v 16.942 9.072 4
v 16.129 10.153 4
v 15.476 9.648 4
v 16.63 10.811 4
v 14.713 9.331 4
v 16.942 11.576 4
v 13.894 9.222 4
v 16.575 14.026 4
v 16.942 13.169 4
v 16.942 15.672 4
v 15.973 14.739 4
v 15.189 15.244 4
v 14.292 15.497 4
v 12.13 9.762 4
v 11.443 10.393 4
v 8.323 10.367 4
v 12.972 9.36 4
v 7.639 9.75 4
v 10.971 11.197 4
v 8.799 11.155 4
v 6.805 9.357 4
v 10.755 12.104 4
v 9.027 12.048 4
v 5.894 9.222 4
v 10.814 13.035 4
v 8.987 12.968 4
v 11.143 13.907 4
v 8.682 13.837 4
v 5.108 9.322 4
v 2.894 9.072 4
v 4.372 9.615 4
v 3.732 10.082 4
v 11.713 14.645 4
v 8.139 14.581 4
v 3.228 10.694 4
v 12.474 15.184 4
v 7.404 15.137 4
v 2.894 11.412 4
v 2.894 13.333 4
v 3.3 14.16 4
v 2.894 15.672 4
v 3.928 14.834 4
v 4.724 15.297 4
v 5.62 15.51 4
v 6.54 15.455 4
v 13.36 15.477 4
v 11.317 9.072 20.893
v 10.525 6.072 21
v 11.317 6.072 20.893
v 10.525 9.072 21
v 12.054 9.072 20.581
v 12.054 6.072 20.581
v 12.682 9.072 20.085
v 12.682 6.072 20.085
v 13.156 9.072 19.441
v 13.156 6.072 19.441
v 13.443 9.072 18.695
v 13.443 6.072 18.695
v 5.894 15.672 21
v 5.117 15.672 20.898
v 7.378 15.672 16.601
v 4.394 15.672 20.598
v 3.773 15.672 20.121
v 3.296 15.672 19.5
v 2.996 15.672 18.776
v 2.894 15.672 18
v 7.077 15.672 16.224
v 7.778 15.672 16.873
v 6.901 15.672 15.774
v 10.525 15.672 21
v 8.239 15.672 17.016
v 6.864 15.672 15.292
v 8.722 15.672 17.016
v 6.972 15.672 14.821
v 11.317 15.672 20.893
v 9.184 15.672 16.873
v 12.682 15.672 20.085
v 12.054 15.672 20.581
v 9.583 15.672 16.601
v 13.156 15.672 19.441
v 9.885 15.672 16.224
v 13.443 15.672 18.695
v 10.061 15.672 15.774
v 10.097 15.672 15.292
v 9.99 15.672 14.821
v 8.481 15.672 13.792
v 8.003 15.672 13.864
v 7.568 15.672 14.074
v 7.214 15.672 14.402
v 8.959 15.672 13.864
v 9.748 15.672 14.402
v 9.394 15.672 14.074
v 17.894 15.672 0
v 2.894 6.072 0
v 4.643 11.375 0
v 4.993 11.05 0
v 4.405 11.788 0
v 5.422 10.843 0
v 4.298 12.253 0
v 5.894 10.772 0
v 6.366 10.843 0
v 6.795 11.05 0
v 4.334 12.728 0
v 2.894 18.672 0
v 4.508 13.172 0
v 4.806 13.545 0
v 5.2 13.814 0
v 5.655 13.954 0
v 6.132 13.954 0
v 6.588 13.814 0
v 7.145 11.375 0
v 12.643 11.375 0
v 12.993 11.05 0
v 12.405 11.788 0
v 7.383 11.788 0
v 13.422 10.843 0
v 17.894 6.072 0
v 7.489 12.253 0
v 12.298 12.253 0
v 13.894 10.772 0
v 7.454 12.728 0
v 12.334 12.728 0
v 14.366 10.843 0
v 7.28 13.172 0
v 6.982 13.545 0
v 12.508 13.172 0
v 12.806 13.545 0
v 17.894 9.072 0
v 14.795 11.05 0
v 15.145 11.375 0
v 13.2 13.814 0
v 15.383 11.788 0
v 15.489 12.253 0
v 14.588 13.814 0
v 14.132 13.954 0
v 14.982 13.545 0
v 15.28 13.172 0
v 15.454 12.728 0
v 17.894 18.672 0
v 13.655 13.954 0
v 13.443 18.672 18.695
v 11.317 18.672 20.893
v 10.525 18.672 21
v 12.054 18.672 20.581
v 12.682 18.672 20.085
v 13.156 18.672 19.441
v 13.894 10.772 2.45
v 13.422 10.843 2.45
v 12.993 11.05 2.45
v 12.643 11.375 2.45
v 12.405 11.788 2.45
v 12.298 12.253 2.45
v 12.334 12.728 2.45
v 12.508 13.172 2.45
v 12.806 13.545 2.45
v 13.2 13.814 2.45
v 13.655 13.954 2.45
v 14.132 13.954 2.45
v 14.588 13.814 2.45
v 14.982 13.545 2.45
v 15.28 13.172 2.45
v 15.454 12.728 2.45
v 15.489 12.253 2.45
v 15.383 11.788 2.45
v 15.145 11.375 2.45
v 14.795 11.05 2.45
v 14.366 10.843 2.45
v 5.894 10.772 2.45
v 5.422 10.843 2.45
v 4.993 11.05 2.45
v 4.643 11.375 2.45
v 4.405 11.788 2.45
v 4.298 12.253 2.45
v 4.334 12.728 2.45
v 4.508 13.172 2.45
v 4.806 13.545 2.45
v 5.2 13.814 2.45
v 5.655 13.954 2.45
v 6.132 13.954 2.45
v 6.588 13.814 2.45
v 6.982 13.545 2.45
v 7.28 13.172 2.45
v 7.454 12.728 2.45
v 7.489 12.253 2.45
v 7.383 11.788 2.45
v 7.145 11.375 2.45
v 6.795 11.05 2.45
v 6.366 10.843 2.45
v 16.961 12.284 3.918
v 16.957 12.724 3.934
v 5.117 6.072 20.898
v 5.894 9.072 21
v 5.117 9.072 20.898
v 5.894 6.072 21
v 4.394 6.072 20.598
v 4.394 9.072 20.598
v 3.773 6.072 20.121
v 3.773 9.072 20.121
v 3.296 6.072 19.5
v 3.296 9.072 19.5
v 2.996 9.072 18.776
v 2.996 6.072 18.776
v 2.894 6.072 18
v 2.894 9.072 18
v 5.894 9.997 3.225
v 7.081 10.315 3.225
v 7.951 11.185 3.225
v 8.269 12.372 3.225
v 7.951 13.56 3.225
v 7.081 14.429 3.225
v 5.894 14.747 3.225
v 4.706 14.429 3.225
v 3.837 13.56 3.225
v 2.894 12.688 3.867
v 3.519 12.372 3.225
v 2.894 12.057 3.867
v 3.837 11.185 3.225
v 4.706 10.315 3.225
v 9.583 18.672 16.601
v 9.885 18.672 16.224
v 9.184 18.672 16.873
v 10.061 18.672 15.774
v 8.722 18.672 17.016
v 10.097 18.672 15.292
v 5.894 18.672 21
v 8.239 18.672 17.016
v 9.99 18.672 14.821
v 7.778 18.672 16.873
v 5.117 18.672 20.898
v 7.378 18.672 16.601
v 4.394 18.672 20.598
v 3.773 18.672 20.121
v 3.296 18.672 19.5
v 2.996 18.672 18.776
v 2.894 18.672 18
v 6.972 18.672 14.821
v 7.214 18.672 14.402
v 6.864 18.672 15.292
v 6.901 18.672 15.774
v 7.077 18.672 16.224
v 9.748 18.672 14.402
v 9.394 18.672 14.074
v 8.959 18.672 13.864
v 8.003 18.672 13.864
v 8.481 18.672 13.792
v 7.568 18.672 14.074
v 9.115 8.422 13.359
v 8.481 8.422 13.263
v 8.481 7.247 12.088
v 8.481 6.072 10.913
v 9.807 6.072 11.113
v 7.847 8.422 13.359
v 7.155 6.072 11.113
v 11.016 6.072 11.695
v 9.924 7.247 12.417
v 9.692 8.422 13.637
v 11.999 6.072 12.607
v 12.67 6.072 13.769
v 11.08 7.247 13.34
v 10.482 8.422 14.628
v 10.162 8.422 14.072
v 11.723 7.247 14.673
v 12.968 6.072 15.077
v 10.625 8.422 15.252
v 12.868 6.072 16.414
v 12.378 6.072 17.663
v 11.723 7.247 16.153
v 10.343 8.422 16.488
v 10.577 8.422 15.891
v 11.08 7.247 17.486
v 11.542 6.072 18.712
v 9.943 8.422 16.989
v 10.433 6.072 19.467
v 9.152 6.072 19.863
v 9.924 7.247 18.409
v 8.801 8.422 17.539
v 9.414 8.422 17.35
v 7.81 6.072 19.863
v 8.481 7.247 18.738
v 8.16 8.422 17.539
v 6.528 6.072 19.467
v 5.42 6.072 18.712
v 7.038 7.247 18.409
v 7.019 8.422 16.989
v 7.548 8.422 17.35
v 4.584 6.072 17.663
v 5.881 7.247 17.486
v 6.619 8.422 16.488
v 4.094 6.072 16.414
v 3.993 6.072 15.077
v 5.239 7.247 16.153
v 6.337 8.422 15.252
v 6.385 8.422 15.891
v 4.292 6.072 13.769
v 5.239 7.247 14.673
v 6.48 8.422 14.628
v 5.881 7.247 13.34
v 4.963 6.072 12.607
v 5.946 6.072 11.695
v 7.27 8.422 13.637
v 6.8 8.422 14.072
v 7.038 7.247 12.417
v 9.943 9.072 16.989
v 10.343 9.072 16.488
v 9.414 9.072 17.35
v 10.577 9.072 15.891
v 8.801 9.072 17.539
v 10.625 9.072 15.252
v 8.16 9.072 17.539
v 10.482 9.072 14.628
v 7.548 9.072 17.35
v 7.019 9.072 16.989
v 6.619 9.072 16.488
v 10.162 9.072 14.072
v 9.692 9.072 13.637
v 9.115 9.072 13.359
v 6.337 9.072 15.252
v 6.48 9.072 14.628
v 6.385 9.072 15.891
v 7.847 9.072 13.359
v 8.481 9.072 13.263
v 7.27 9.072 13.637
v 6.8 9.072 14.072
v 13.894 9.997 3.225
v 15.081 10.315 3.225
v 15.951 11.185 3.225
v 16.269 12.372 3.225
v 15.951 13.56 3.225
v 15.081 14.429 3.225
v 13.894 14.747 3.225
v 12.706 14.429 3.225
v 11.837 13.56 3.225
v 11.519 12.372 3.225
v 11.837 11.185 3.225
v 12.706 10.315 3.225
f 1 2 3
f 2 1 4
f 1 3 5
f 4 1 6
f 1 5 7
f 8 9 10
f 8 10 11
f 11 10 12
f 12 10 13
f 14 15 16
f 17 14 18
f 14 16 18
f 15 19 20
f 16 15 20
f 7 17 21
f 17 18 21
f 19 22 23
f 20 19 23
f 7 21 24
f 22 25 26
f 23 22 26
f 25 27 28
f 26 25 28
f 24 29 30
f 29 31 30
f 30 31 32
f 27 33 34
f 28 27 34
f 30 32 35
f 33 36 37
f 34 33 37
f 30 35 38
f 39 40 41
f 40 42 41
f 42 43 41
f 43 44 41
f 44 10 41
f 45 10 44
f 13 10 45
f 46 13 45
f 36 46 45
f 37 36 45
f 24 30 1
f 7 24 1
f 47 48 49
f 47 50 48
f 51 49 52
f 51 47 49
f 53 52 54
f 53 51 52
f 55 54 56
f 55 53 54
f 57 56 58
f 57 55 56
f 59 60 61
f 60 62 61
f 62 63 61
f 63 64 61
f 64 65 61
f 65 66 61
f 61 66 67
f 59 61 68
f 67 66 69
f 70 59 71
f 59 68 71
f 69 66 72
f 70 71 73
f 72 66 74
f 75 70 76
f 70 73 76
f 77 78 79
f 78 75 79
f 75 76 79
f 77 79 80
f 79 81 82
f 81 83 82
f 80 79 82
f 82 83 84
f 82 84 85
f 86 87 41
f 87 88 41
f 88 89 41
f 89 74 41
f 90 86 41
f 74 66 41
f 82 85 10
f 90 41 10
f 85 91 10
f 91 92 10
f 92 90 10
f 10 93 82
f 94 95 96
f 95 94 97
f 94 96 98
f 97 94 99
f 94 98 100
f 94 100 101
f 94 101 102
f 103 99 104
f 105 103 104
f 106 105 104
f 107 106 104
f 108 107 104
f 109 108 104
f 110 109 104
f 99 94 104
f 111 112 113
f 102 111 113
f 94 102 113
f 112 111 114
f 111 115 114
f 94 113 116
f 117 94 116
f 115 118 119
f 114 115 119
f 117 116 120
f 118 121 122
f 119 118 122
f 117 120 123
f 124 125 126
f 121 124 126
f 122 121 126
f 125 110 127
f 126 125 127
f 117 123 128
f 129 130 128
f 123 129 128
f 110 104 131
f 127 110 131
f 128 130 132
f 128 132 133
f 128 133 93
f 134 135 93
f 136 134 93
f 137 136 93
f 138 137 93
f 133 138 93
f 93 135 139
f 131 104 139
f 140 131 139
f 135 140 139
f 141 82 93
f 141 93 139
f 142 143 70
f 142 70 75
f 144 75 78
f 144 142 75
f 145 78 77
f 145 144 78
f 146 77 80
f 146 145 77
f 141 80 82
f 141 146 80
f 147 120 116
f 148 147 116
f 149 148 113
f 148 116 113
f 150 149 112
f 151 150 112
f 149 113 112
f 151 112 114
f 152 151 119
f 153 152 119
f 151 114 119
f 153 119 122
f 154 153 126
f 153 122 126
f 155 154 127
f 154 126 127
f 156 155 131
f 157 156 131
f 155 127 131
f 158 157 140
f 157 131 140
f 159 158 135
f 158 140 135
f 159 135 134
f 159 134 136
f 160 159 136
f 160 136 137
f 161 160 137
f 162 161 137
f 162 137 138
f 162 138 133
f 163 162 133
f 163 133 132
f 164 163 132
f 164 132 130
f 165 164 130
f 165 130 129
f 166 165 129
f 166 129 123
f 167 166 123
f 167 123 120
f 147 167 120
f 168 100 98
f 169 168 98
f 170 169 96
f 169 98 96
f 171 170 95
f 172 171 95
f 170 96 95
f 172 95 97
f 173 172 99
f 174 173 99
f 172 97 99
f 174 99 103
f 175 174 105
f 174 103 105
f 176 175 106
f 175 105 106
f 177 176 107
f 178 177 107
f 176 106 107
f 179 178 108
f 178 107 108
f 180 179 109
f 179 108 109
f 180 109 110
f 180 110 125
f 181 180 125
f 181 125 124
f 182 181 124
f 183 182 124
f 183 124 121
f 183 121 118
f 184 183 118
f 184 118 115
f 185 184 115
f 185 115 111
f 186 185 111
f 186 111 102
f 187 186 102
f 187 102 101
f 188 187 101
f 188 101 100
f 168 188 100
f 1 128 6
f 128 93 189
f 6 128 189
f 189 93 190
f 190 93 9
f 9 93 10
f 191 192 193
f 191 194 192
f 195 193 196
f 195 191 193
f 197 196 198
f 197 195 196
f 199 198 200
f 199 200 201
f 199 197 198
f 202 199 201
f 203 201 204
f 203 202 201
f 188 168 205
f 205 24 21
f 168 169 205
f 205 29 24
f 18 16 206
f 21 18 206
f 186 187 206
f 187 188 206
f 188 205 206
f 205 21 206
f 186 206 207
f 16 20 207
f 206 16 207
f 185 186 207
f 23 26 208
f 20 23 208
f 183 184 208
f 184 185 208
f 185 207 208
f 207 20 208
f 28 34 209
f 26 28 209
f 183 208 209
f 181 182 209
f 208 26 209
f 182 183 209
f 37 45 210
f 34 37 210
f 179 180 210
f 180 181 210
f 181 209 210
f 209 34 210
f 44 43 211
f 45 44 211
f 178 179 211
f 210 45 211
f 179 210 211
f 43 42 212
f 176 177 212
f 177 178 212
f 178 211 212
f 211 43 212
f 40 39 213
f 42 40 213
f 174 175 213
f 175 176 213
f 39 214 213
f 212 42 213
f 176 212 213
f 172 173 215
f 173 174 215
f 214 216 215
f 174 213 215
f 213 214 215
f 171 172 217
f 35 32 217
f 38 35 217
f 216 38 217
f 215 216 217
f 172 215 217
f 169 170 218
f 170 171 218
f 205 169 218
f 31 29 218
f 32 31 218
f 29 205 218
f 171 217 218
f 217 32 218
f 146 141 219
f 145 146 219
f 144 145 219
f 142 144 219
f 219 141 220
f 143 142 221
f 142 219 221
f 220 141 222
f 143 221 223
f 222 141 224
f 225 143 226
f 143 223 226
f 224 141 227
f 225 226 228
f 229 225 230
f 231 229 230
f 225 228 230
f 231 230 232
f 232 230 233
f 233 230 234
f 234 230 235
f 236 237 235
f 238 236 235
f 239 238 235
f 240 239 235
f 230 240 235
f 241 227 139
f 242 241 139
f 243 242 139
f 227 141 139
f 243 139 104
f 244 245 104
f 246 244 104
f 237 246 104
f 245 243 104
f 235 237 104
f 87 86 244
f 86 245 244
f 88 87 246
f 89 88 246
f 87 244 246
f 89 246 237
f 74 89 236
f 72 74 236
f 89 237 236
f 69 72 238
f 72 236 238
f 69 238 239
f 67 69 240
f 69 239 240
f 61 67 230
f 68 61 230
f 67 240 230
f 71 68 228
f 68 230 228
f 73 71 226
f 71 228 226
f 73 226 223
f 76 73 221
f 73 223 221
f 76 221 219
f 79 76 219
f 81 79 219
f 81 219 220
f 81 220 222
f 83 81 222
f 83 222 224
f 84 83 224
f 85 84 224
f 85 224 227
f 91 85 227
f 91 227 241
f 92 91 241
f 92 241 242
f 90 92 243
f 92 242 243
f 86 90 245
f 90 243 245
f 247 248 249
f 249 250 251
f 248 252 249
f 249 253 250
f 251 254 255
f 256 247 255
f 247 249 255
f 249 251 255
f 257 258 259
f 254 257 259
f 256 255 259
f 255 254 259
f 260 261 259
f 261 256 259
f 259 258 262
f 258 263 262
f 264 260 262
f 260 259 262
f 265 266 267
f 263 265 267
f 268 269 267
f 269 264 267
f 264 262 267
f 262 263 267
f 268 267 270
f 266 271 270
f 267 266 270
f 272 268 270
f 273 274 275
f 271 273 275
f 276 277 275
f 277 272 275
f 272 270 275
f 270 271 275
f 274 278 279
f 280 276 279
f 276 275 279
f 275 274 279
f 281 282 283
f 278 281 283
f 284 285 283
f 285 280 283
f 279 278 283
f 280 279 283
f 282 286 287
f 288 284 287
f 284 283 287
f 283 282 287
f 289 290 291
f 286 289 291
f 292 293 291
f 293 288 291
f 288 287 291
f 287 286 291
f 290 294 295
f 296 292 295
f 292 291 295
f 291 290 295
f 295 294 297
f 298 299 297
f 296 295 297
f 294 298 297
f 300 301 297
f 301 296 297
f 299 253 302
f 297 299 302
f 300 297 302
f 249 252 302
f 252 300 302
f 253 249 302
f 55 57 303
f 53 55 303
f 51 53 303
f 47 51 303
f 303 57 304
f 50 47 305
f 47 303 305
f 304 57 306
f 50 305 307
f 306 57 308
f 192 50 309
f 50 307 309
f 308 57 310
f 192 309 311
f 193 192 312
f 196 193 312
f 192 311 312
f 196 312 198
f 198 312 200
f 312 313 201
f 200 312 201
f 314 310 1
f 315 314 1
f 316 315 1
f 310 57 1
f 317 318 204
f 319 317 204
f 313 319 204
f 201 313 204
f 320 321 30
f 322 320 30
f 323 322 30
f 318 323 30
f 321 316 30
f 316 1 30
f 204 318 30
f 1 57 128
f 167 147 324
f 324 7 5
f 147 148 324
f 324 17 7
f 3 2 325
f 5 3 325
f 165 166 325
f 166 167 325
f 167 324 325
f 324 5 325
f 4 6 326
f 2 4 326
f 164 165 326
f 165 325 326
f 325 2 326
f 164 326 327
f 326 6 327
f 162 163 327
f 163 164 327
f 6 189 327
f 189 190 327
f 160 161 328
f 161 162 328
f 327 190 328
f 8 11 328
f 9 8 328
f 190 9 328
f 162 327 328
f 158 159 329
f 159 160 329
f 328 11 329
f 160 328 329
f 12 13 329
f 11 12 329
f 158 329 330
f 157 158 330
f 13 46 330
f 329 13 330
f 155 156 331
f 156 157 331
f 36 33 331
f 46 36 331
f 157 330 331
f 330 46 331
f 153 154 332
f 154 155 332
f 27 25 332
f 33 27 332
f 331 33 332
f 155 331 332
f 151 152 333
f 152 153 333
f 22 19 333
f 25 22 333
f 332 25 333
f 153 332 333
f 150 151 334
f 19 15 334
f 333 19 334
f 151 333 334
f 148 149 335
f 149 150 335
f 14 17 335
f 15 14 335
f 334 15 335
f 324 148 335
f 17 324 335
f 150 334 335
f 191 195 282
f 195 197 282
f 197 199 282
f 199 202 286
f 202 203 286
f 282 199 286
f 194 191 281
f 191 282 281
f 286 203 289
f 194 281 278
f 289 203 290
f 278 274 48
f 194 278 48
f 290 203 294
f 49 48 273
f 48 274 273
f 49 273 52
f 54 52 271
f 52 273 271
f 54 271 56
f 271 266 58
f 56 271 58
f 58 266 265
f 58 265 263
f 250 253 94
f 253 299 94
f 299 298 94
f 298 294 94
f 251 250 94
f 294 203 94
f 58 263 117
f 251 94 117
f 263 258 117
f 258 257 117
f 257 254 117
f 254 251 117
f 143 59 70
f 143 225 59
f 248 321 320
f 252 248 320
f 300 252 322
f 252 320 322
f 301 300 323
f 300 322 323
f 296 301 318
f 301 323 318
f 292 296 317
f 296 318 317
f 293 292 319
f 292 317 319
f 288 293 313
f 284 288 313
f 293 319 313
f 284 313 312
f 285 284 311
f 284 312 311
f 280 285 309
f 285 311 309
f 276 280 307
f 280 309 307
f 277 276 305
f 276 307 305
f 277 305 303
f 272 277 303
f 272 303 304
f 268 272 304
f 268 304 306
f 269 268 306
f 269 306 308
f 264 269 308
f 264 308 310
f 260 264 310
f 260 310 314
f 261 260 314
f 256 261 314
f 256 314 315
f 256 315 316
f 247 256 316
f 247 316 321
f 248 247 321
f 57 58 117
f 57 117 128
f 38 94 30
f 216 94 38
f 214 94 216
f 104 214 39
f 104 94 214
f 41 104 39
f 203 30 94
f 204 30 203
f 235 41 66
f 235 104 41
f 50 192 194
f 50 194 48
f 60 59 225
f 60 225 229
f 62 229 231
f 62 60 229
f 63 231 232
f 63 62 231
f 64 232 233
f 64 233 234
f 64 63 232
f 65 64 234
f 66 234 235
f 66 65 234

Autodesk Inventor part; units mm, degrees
ref_plane "YZ Plane" through (0, 0, 0) normal (1, 0, 0) x (0, 1, 0)
ref_plane "XZ Plane" through (0, 0, 0) normal (0, 1, 0) x (-1, 0, 0)
ref_plane "XY Plane" through (0, 0, 0) normal (0, 0, 1) x (1, 0, 0)
sketch "Skizze1" plane through (0, 0, 0) normal (0, 0, 1) x (1, 0, 0)
  line L0 (17.8939, 18.6723) -> (2.8939, 18.6723)
  line L1 (2.8939, 18.6723) -> (2.8939, 15.6723)
  line L2 (2.8939, 15.6723) -> (17.8939, 15.6723)
  line L3 (17.8939, 15.6723) -> (17.8939, 18.6723)
  line L4 (17.8939, 9.0723) -> (2.8939, 9.0723)
  line L5 (2.8939, 9.0723) -> (2.8939, 6.0723)
  line L6 (2.8939, 6.0723) -> (17.8939, 6.0723)
  line L7 (17.8939, 6.0723) -> (17.8939, 9.0723)
  line L8 (17.8939, 15.6723) -> (17.8939, 12.3723) construction
  line L9 (17.8939, 12.3723) -> (17.8939, 9.0723) construction
  point P0 (0, 0)
  point P1 (10.3939, 9.0723)
  dimension "d0" = 15
  dimension "d1" = 3
  dimension "d2" = 3
  dimension "d3" = 6.6
extrude "Extrusion1" add sketch "Skizze1" along normal blind 21
chamfer "Fasen1" distance 5 distance2 21 1 edges at (17.8939, 7.5723, 21) measured on face at (7.8939, 8.0723, 21)
chamfer "Fasen2" distance 5 distance2 21 1 edges at (17.8939, 17.1723, 21) measured on face at (7.8939, 17.6723, 21)
fillet "Rundung1" radius 3 4 edges at (2.8939, 17.1723, 21) (2.8939, 7.5723, 21) (12.8944, 17.1723, 21) (12.8944, 7.5723, 21)
sketch "Skizze2" plane through (2.8939, 6.0723, 0) normal (0, -1, 0) x (1, 0, 0)
  circle A0 centre (5.587, 15.413) radius 5.587 construction
  line L0 (0, 0) -> (0, 21) construction
  line L1 (5.587, 15.413) -> (5.587, 21)
  line L2 (5.587, 15.413) -> (0, 15.413)
  line L3 (3, 21) -> (7.6304, 21) projected
  line L4 (10.5488, 18.6949) -> (15, 0) projected
  point P0 (-2.8939, 0)
  point P1 (0, 18)
hole "Bohrung1" at (8.4809, 6.0723, 15.413) direction (0, 1, 0) diameter 3.242 end through all countersink diameter 9 countersink angle 90 thread size "M4x0.7" class "6H" standard "ISO Metric profile"
sketch "Skizze3" plane through (2.8939, 15.6723, 0) normal (0, -1, 0) x (1, 0, 0)
  line L0 (0, 0) -> (15, 0) projected
  line L1 (15, 0) -> (14.0476, 4)
  line L2 (14.0476, 4) -> (0, 4)
  line L3 (0, 0) -> (0, 21) projected
  line L4 (15, 0) -> (10.5488, 18.6949) projected
  point P0 (-2.8939, 0)
  point P1 (0, 18)
  dimension "d51" = 4
extrude "Extrusion2" add sketch "Skizze3" along normal through all
sketch "Skizze4" plane through (2.8939, 15.6723, 4) normal (0, 0, 1) x (1, 0, 0)
  line L0 (7.6304, 3) -> (3, 3) construction
  line L1 (3, -3.3) -> (11, -3.3)
  line L2 (3, -3.3) -> (0, -3.3)
  line L3 (0, 0) -> (0, -6.6) projected
  line L4 (14.0476, 0) -> (14.0476, -6.6) projected
  point P0 (12, 3)
  point P1 (14.0476, -3.3)
  point P2 (14.5, 0)
  dimension "d48" = 8
  dimension "d49" = 3
  dimension "d50" = 3.0476
hole "Bohrung2" at (13.8939, 12.3723, 4) at (5.8939, 12.3723, 4) direction (0, 0, -1) diameter 3.2 end through all countersink diameter 6.3 countersink angle 90 clearance for "Flachkopfmaschinenschraube" size "M3" standard "ANSI Metrisches M Profil"
sketch "Skizze5" plane through (2.8939, 6.0723, 0) normal (0, -1, 0) x (1, 0, 0)
  circle A0 centre (5.587, 15.413) radius 4.5 projected
  point P0 (-2.8939, 0)
  point P1 (11.255, 14.9799)
  point P2 (11.9803, 12.079)
hole "Bohrung3" at (8.4809, 6.0723, 15.413) direction (0, 1, 0) diameter 4.3 depth 3 clearance for "Flachkopfmaschinenschraube" size "M4" standard "ANSI Metrisches M Profil"
properties part number "HalterUmlenkrolleH" material "Aluminium 6061(1)"
